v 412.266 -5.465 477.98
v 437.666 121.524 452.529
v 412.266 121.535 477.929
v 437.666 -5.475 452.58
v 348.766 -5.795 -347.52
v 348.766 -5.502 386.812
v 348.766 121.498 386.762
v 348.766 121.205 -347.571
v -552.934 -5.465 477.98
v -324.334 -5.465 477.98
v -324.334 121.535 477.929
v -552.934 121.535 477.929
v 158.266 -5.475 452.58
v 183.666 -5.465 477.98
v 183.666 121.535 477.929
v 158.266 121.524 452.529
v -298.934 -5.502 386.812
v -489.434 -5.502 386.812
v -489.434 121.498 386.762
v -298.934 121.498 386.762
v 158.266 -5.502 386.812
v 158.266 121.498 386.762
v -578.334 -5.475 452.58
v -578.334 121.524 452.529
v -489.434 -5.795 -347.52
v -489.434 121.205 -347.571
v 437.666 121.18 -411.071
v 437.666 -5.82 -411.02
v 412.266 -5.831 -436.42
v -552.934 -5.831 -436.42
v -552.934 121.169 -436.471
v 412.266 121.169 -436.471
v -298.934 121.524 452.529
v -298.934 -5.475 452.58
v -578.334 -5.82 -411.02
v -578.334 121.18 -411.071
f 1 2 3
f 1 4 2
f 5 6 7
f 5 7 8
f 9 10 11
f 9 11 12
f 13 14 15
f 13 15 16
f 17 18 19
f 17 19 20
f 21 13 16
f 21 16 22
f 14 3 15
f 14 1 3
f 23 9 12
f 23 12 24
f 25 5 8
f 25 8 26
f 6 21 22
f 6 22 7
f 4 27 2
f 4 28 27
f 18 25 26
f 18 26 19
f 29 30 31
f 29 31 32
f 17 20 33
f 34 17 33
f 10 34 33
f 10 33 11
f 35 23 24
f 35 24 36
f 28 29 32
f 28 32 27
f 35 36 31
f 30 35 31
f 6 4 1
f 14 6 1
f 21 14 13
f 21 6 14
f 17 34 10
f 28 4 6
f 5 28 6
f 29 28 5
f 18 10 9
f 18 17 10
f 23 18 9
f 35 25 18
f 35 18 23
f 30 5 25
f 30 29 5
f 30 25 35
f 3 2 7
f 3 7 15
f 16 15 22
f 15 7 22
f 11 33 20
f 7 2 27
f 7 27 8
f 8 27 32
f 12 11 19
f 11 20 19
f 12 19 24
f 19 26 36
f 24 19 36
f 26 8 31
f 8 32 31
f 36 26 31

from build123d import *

# Parameters (mm, degrees)
BOSS_EXTRUDE1_DEPTH = 63.5


with BuildPart() as part:
    # Sketch1 → Boss-Extrude1 (new body, symmetric)
    with BuildSketch(Plane(origin=(0, 57.843753362, -2.3797e-05), x_dir=(-1, 0, 0), z_dir=(0, -0.99999992, 0.0003994))):
        Polygon((-412.265833354, -477.954450626), (-183.665833354, -477.954450626), (-158.265833354, -452.554448601), (-158.265833354, -386.787080658), (-348.765833354, -386.787080658), (-348.765833354, 347.545615216), (489.434166646, 347.545615216), (489.434166646, -386.787080658), (298.934166646, -386.787080658), (298.934166646, -452.554448601), (324.334166646, -477.954450626), (552.934166646, -477.954450626), (578.334166646, -452.554448601), (578.334166646, 411.04562028), (552.934166646, 436.445622306), (-412.265833354, 436.445622306), (-437.665833354, 411.04562028), (-437.665833354, -452.554448601), align=None)
    extrude(amount=BOSS_EXTRUDE1_DEPTH, both=True)


solid = part.part
